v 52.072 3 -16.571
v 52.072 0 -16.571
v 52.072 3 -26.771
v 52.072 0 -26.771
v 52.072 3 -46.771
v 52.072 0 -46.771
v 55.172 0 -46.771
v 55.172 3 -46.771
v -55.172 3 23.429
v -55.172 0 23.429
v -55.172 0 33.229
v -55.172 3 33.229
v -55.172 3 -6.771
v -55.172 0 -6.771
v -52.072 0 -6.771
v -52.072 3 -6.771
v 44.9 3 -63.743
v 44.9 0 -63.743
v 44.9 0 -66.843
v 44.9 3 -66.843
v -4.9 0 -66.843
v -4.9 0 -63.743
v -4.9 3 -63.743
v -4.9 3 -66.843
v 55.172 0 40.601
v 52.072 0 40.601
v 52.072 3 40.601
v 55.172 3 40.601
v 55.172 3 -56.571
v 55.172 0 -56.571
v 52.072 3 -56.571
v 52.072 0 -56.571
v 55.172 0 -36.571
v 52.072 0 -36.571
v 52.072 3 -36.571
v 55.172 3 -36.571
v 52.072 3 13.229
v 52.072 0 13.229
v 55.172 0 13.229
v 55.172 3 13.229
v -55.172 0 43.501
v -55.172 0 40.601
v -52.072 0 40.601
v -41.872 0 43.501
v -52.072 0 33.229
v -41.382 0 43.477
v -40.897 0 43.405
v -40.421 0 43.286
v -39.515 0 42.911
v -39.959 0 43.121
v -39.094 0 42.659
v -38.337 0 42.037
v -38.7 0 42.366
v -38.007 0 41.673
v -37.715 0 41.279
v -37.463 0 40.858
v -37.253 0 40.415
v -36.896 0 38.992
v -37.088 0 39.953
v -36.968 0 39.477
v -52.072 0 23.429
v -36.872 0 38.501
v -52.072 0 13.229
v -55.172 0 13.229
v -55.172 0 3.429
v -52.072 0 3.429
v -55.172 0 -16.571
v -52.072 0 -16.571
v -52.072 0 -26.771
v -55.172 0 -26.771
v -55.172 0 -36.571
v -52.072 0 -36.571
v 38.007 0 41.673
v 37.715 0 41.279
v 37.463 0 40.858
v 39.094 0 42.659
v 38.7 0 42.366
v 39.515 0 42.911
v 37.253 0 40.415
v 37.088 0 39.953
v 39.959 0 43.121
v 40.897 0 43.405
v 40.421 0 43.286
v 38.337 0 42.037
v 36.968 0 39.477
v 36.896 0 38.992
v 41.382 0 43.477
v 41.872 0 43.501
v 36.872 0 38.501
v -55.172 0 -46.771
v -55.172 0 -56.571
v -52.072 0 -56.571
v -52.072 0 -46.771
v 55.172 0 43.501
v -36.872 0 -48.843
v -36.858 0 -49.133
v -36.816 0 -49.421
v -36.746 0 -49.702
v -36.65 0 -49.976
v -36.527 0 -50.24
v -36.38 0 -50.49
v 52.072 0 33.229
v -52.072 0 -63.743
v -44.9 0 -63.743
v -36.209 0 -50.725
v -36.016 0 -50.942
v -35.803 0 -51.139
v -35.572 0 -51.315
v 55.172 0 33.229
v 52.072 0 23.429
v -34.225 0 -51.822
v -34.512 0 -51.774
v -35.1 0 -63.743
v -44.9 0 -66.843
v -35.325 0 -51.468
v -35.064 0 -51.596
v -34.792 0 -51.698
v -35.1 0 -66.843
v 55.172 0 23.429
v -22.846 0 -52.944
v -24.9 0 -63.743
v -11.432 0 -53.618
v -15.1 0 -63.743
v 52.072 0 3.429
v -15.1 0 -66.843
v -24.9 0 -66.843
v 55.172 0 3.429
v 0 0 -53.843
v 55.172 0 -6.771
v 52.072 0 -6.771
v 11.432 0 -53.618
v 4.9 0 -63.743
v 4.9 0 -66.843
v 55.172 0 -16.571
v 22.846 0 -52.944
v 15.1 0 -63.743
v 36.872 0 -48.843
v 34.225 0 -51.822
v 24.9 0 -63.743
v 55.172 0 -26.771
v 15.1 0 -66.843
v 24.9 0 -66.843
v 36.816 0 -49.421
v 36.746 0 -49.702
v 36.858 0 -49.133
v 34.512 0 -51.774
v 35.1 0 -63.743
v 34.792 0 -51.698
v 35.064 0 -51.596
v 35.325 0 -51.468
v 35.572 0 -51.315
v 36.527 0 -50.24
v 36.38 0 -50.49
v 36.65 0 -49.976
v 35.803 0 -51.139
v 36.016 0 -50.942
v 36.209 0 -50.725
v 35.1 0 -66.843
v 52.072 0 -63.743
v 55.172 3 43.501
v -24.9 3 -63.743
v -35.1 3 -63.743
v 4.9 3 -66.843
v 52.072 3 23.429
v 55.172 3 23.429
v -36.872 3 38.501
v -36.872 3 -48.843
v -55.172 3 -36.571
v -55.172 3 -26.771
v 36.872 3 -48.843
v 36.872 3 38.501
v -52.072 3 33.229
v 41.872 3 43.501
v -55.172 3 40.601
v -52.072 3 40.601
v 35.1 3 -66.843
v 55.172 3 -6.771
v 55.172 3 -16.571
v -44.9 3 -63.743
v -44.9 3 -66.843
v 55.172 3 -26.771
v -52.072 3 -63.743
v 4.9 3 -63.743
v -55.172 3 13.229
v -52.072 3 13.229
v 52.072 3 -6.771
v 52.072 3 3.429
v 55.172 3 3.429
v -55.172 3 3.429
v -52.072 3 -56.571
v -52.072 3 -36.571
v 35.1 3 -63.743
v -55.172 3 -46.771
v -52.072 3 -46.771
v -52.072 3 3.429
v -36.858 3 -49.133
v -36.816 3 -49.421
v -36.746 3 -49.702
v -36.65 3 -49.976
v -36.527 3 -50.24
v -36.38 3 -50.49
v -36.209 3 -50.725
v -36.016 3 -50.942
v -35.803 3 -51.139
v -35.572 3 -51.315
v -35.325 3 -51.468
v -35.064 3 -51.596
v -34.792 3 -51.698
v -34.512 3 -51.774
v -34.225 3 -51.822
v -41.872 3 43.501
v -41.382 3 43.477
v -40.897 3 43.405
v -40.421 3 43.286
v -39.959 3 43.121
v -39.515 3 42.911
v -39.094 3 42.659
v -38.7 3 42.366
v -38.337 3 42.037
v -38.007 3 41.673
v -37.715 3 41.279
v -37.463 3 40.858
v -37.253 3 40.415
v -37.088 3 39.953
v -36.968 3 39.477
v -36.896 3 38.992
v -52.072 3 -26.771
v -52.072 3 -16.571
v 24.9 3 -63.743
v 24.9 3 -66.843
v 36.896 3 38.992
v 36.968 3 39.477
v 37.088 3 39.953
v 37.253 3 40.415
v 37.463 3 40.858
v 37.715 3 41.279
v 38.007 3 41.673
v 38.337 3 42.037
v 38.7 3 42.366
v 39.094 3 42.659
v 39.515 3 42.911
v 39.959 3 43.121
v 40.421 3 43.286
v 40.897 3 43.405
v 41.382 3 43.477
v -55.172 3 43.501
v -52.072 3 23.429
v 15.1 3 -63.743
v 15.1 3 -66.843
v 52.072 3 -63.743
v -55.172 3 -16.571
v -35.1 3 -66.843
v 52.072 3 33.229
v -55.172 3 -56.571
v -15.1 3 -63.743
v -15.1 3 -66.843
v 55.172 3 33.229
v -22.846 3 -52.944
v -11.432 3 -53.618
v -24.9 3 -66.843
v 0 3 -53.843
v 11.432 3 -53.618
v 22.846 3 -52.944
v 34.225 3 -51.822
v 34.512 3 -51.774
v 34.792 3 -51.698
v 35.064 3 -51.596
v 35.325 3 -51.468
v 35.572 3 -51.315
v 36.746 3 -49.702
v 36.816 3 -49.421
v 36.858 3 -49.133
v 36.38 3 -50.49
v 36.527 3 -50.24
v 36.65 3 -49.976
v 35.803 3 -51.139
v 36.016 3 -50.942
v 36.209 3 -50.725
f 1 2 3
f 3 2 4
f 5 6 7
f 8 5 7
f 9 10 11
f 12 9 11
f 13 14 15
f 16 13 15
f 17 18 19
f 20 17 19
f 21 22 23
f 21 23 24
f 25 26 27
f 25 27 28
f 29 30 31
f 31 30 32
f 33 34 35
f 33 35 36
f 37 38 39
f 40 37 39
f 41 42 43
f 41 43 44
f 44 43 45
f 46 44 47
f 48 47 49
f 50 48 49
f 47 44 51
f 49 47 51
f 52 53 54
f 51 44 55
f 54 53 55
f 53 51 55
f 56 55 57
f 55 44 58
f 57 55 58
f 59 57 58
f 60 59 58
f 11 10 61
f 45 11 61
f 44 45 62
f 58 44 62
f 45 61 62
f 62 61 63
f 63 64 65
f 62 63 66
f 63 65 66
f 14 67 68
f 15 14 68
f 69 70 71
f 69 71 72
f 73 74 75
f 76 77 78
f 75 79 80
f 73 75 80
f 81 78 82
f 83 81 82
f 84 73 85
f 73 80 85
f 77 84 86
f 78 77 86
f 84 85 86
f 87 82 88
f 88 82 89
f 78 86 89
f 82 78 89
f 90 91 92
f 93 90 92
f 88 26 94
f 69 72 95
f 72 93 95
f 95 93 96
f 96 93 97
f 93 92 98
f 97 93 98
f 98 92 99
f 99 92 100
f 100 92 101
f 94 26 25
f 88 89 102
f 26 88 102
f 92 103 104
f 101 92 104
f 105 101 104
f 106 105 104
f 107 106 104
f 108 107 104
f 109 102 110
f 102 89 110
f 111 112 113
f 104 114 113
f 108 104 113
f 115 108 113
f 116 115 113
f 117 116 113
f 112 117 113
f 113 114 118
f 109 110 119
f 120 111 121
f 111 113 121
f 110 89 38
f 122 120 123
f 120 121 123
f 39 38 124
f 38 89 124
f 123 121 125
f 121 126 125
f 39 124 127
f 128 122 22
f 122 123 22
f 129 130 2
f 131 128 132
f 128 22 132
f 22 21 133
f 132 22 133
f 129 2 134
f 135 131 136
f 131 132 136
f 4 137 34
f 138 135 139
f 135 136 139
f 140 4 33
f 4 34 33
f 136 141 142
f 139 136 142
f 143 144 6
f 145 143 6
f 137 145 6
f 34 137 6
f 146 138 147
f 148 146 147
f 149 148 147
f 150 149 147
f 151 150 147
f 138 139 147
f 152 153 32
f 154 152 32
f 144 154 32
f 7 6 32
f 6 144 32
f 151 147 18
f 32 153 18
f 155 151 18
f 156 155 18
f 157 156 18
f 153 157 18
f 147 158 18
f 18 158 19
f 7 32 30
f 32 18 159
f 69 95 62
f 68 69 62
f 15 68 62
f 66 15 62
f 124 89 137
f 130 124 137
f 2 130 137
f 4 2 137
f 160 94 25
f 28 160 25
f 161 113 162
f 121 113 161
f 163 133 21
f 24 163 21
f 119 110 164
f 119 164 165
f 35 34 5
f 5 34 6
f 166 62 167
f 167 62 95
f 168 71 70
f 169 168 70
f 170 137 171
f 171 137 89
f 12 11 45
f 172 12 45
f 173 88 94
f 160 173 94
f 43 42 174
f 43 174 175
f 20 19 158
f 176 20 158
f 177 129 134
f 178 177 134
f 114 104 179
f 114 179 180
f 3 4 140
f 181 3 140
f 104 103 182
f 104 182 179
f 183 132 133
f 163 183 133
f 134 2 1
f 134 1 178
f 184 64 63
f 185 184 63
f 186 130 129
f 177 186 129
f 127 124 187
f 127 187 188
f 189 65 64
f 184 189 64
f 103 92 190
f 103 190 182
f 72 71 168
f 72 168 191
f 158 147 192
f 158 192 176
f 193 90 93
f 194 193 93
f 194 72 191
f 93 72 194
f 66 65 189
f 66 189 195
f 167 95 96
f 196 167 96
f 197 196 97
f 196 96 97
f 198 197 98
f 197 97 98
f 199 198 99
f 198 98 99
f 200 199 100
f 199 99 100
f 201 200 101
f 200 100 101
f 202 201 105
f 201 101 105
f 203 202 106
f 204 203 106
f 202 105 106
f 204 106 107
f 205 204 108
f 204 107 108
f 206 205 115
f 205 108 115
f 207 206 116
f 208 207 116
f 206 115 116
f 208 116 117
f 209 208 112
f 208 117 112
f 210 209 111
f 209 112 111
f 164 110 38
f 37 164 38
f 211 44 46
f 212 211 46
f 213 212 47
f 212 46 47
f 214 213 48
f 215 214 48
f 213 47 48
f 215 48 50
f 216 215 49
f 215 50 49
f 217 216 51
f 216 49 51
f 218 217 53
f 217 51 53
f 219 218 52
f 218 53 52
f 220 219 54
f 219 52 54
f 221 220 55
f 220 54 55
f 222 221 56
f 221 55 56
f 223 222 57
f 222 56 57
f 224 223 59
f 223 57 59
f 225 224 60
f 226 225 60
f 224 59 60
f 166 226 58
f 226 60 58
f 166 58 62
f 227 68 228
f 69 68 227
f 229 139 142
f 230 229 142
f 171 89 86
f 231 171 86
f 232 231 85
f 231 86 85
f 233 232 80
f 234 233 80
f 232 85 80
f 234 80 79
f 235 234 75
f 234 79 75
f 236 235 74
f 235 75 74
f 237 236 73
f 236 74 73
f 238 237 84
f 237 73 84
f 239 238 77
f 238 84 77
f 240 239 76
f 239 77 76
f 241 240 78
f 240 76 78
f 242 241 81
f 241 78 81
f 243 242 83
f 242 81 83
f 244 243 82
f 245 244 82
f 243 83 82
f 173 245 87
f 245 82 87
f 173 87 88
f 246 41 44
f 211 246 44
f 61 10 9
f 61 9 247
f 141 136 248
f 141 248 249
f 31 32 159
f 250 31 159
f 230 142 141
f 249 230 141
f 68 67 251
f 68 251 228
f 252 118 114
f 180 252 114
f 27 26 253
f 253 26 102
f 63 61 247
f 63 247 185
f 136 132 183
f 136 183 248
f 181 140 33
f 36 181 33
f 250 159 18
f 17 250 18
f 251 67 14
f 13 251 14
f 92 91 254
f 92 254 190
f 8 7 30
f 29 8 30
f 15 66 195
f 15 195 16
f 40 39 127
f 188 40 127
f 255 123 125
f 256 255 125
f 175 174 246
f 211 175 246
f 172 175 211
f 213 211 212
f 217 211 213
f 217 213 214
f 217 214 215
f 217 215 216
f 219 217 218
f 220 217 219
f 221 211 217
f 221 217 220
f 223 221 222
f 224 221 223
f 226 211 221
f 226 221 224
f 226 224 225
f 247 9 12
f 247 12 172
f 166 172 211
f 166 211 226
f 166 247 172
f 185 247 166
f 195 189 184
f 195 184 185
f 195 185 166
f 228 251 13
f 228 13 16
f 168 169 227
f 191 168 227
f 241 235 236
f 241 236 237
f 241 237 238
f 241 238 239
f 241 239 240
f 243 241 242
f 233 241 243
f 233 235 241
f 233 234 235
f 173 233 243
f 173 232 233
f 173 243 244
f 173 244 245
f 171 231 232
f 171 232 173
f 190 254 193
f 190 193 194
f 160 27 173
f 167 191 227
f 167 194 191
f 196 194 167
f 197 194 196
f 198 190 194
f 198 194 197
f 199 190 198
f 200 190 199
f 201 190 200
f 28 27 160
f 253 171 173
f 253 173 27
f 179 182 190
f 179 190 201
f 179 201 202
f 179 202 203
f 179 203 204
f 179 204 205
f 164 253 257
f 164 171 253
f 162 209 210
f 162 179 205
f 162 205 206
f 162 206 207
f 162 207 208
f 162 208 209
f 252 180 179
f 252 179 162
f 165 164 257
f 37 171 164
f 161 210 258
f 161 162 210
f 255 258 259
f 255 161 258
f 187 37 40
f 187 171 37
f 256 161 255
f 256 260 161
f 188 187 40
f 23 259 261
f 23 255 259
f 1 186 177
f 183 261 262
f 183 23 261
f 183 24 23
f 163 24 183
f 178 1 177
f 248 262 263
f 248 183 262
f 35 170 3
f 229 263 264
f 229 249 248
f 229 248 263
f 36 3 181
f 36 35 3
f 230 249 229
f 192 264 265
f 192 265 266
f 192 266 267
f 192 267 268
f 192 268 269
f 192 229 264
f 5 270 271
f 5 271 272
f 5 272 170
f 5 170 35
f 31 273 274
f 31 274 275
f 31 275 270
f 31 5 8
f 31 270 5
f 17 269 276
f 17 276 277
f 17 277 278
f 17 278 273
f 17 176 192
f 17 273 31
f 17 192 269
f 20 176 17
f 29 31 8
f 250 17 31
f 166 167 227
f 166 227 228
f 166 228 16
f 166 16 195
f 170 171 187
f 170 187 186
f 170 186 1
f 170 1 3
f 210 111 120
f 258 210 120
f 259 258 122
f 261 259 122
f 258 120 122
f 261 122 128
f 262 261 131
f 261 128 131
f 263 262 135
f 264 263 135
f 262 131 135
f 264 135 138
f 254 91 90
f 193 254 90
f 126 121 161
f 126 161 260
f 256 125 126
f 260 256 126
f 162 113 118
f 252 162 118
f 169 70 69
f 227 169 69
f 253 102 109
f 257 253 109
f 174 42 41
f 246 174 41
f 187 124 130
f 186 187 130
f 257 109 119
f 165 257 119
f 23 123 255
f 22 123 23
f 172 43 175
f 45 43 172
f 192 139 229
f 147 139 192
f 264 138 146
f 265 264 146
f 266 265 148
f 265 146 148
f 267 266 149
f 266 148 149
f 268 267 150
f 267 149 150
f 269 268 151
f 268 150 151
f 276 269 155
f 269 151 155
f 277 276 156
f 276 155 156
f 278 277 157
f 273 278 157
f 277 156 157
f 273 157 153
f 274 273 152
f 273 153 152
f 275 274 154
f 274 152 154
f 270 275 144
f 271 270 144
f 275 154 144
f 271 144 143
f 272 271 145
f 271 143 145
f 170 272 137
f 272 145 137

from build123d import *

# Parameters (mm, degrees)
BOSS_EXTRUDE1_DEPTH = 3
SKETCH2_W           = 3.2
SKETCH2_H           = 7.372217102
SKETCH2_H_2         = 10.2
SKETCH2_W_2         = 10.2
SKETCH2_H_3         = 3.2
CUT_EXTRUDE1_DEPTH  = 4


with BuildPart() as part:
    # Sketch1 → Boss-Extrude1 (new body)
    with BuildSketch(Plane(origin=(0, 0, 0), x_dir=(1, 0, 0), z_dir=(0, 1, 0))):
        with BuildLine():
            Line((55.172217102, -43.501443346), (55.172217102, 66.842990858))
            Line((55.172217102, 66.842990858), (-55.172217102, 66.842990858))
            Line((-55.172217102, 66.842990858), (-55.172217102, -43.501443346))
            Line((-55.172217102, -43.501443346), (-41.872217102, -43.501443346))
            ThreePointArc((-41.872217102, -43.501443346), (-38.336683196, -42.036977252), (-36.872217102, -38.501443346))
            Line((-36.872217102, -38.501443346), (-36.872217102, 48.842990858))
            ThreePointArc((-36.872217102, 48.842990858), (-36.114885762, 50.835586471), (-34.225258916, 51.822145348))
            ThreePointArc((-34.225258916, 51.822145348), (0, 53.842990858), (34.225258916, 51.822145348))
            ThreePointArc((34.225258916, 51.822145348), (36.114885762, 50.835586471), (36.872217102, 48.842990858))
            Line((36.872217102, 48.842990858), (36.872217102, -38.501443346))
            ThreePointArc((36.872217102, -38.501443346), (38.336683196, -42.036977252), (41.872217102, -43.501443346))
            Line((41.872217102, -43.501443346), (55.172217102, -43.501443346))
        make_face()
    extrude(amount=BOSS_EXTRUDE1_DEPTH)

    # Sketch2 → Cut-Extrude1 (cut, through all)
    with BuildSketch(Plane(origin=(0, 0, 0), x_dir=(1, 0, 0), z_dir=(0, 1, 0))):
        with Locations((-53.672217102, -36.915334795)):
            Rectangle(SKETCH2_W, SKETCH2_H)
        Polygon((-44.9, 63.742990858), (-44.9, 66.942990858), (-55.272217102, 66.942990858), (-55.272217102, 56.570773756), (-52.072217102, 56.570773756), (-52.072217102, 63.742990858), align=None)
        with Locations((-53.672217102, 1.670773756)):
            Rectangle(SKETCH2_W, SKETCH2_H_2)
        with Locations((-53.672217102, -18.329226244)):
            Rectangle(SKETCH2_W, SKETCH2_H_2)
        with Locations((-53.672217102, 21.670773756)):
            Rectangle(SKETCH2_W, SKETCH2_H_2)
        with Locations((-53.672217102, 41.670773756)):
            Rectangle(SKETCH2_W, SKETCH2_H_2)
        with Locations((-30, 65.342990858)):
            Rectangle(SKETCH2_W_2, SKETCH2_H_3)
        with Locations((-10, 65.342990858)):
            Rectangle(SKETCH2_W_2, SKETCH2_H_3)
        with Locations((53.672217102, 41.670773756)):
            Rectangle(SKETCH2_W, SKETCH2_H_2)
        with Locations((53.672217102, 21.670773756)):
            Rectangle(SKETCH2_W, SKETCH2_H_2)
        with Locations((53.672217102, 1.670773756)):
            Rectangle(SKETCH2_W, SKETCH2_H_2)
        with Locations((53.672217102, -18.329226244)):
            Rectangle(SKETCH2_W, SKETCH2_H_2)
        with Locations((53.672217102, -36.915334795)):
            Rectangle(SKETCH2_W, SKETCH2_H)
        with Locations((30, 65.342990858)):
            Rectangle(SKETCH2_W_2, SKETCH2_H_3)
        with Locations((10, 65.342990858)):
            Rectangle(SKETCH2_W_2, SKETCH2_H_3)
        Polygon((44.9, 66.942990858), (55.272217102, 66.942990858), (55.272217102, 56.570773756), (52.072217102, 56.570773756), (52.072217102, 63.742990858), (44.9, 63.742990858), align=None)
    extrude(amount=CUT_EXTRUDE1_DEPTH, mode=Mode.SUBTRACT)


solid = part.part
